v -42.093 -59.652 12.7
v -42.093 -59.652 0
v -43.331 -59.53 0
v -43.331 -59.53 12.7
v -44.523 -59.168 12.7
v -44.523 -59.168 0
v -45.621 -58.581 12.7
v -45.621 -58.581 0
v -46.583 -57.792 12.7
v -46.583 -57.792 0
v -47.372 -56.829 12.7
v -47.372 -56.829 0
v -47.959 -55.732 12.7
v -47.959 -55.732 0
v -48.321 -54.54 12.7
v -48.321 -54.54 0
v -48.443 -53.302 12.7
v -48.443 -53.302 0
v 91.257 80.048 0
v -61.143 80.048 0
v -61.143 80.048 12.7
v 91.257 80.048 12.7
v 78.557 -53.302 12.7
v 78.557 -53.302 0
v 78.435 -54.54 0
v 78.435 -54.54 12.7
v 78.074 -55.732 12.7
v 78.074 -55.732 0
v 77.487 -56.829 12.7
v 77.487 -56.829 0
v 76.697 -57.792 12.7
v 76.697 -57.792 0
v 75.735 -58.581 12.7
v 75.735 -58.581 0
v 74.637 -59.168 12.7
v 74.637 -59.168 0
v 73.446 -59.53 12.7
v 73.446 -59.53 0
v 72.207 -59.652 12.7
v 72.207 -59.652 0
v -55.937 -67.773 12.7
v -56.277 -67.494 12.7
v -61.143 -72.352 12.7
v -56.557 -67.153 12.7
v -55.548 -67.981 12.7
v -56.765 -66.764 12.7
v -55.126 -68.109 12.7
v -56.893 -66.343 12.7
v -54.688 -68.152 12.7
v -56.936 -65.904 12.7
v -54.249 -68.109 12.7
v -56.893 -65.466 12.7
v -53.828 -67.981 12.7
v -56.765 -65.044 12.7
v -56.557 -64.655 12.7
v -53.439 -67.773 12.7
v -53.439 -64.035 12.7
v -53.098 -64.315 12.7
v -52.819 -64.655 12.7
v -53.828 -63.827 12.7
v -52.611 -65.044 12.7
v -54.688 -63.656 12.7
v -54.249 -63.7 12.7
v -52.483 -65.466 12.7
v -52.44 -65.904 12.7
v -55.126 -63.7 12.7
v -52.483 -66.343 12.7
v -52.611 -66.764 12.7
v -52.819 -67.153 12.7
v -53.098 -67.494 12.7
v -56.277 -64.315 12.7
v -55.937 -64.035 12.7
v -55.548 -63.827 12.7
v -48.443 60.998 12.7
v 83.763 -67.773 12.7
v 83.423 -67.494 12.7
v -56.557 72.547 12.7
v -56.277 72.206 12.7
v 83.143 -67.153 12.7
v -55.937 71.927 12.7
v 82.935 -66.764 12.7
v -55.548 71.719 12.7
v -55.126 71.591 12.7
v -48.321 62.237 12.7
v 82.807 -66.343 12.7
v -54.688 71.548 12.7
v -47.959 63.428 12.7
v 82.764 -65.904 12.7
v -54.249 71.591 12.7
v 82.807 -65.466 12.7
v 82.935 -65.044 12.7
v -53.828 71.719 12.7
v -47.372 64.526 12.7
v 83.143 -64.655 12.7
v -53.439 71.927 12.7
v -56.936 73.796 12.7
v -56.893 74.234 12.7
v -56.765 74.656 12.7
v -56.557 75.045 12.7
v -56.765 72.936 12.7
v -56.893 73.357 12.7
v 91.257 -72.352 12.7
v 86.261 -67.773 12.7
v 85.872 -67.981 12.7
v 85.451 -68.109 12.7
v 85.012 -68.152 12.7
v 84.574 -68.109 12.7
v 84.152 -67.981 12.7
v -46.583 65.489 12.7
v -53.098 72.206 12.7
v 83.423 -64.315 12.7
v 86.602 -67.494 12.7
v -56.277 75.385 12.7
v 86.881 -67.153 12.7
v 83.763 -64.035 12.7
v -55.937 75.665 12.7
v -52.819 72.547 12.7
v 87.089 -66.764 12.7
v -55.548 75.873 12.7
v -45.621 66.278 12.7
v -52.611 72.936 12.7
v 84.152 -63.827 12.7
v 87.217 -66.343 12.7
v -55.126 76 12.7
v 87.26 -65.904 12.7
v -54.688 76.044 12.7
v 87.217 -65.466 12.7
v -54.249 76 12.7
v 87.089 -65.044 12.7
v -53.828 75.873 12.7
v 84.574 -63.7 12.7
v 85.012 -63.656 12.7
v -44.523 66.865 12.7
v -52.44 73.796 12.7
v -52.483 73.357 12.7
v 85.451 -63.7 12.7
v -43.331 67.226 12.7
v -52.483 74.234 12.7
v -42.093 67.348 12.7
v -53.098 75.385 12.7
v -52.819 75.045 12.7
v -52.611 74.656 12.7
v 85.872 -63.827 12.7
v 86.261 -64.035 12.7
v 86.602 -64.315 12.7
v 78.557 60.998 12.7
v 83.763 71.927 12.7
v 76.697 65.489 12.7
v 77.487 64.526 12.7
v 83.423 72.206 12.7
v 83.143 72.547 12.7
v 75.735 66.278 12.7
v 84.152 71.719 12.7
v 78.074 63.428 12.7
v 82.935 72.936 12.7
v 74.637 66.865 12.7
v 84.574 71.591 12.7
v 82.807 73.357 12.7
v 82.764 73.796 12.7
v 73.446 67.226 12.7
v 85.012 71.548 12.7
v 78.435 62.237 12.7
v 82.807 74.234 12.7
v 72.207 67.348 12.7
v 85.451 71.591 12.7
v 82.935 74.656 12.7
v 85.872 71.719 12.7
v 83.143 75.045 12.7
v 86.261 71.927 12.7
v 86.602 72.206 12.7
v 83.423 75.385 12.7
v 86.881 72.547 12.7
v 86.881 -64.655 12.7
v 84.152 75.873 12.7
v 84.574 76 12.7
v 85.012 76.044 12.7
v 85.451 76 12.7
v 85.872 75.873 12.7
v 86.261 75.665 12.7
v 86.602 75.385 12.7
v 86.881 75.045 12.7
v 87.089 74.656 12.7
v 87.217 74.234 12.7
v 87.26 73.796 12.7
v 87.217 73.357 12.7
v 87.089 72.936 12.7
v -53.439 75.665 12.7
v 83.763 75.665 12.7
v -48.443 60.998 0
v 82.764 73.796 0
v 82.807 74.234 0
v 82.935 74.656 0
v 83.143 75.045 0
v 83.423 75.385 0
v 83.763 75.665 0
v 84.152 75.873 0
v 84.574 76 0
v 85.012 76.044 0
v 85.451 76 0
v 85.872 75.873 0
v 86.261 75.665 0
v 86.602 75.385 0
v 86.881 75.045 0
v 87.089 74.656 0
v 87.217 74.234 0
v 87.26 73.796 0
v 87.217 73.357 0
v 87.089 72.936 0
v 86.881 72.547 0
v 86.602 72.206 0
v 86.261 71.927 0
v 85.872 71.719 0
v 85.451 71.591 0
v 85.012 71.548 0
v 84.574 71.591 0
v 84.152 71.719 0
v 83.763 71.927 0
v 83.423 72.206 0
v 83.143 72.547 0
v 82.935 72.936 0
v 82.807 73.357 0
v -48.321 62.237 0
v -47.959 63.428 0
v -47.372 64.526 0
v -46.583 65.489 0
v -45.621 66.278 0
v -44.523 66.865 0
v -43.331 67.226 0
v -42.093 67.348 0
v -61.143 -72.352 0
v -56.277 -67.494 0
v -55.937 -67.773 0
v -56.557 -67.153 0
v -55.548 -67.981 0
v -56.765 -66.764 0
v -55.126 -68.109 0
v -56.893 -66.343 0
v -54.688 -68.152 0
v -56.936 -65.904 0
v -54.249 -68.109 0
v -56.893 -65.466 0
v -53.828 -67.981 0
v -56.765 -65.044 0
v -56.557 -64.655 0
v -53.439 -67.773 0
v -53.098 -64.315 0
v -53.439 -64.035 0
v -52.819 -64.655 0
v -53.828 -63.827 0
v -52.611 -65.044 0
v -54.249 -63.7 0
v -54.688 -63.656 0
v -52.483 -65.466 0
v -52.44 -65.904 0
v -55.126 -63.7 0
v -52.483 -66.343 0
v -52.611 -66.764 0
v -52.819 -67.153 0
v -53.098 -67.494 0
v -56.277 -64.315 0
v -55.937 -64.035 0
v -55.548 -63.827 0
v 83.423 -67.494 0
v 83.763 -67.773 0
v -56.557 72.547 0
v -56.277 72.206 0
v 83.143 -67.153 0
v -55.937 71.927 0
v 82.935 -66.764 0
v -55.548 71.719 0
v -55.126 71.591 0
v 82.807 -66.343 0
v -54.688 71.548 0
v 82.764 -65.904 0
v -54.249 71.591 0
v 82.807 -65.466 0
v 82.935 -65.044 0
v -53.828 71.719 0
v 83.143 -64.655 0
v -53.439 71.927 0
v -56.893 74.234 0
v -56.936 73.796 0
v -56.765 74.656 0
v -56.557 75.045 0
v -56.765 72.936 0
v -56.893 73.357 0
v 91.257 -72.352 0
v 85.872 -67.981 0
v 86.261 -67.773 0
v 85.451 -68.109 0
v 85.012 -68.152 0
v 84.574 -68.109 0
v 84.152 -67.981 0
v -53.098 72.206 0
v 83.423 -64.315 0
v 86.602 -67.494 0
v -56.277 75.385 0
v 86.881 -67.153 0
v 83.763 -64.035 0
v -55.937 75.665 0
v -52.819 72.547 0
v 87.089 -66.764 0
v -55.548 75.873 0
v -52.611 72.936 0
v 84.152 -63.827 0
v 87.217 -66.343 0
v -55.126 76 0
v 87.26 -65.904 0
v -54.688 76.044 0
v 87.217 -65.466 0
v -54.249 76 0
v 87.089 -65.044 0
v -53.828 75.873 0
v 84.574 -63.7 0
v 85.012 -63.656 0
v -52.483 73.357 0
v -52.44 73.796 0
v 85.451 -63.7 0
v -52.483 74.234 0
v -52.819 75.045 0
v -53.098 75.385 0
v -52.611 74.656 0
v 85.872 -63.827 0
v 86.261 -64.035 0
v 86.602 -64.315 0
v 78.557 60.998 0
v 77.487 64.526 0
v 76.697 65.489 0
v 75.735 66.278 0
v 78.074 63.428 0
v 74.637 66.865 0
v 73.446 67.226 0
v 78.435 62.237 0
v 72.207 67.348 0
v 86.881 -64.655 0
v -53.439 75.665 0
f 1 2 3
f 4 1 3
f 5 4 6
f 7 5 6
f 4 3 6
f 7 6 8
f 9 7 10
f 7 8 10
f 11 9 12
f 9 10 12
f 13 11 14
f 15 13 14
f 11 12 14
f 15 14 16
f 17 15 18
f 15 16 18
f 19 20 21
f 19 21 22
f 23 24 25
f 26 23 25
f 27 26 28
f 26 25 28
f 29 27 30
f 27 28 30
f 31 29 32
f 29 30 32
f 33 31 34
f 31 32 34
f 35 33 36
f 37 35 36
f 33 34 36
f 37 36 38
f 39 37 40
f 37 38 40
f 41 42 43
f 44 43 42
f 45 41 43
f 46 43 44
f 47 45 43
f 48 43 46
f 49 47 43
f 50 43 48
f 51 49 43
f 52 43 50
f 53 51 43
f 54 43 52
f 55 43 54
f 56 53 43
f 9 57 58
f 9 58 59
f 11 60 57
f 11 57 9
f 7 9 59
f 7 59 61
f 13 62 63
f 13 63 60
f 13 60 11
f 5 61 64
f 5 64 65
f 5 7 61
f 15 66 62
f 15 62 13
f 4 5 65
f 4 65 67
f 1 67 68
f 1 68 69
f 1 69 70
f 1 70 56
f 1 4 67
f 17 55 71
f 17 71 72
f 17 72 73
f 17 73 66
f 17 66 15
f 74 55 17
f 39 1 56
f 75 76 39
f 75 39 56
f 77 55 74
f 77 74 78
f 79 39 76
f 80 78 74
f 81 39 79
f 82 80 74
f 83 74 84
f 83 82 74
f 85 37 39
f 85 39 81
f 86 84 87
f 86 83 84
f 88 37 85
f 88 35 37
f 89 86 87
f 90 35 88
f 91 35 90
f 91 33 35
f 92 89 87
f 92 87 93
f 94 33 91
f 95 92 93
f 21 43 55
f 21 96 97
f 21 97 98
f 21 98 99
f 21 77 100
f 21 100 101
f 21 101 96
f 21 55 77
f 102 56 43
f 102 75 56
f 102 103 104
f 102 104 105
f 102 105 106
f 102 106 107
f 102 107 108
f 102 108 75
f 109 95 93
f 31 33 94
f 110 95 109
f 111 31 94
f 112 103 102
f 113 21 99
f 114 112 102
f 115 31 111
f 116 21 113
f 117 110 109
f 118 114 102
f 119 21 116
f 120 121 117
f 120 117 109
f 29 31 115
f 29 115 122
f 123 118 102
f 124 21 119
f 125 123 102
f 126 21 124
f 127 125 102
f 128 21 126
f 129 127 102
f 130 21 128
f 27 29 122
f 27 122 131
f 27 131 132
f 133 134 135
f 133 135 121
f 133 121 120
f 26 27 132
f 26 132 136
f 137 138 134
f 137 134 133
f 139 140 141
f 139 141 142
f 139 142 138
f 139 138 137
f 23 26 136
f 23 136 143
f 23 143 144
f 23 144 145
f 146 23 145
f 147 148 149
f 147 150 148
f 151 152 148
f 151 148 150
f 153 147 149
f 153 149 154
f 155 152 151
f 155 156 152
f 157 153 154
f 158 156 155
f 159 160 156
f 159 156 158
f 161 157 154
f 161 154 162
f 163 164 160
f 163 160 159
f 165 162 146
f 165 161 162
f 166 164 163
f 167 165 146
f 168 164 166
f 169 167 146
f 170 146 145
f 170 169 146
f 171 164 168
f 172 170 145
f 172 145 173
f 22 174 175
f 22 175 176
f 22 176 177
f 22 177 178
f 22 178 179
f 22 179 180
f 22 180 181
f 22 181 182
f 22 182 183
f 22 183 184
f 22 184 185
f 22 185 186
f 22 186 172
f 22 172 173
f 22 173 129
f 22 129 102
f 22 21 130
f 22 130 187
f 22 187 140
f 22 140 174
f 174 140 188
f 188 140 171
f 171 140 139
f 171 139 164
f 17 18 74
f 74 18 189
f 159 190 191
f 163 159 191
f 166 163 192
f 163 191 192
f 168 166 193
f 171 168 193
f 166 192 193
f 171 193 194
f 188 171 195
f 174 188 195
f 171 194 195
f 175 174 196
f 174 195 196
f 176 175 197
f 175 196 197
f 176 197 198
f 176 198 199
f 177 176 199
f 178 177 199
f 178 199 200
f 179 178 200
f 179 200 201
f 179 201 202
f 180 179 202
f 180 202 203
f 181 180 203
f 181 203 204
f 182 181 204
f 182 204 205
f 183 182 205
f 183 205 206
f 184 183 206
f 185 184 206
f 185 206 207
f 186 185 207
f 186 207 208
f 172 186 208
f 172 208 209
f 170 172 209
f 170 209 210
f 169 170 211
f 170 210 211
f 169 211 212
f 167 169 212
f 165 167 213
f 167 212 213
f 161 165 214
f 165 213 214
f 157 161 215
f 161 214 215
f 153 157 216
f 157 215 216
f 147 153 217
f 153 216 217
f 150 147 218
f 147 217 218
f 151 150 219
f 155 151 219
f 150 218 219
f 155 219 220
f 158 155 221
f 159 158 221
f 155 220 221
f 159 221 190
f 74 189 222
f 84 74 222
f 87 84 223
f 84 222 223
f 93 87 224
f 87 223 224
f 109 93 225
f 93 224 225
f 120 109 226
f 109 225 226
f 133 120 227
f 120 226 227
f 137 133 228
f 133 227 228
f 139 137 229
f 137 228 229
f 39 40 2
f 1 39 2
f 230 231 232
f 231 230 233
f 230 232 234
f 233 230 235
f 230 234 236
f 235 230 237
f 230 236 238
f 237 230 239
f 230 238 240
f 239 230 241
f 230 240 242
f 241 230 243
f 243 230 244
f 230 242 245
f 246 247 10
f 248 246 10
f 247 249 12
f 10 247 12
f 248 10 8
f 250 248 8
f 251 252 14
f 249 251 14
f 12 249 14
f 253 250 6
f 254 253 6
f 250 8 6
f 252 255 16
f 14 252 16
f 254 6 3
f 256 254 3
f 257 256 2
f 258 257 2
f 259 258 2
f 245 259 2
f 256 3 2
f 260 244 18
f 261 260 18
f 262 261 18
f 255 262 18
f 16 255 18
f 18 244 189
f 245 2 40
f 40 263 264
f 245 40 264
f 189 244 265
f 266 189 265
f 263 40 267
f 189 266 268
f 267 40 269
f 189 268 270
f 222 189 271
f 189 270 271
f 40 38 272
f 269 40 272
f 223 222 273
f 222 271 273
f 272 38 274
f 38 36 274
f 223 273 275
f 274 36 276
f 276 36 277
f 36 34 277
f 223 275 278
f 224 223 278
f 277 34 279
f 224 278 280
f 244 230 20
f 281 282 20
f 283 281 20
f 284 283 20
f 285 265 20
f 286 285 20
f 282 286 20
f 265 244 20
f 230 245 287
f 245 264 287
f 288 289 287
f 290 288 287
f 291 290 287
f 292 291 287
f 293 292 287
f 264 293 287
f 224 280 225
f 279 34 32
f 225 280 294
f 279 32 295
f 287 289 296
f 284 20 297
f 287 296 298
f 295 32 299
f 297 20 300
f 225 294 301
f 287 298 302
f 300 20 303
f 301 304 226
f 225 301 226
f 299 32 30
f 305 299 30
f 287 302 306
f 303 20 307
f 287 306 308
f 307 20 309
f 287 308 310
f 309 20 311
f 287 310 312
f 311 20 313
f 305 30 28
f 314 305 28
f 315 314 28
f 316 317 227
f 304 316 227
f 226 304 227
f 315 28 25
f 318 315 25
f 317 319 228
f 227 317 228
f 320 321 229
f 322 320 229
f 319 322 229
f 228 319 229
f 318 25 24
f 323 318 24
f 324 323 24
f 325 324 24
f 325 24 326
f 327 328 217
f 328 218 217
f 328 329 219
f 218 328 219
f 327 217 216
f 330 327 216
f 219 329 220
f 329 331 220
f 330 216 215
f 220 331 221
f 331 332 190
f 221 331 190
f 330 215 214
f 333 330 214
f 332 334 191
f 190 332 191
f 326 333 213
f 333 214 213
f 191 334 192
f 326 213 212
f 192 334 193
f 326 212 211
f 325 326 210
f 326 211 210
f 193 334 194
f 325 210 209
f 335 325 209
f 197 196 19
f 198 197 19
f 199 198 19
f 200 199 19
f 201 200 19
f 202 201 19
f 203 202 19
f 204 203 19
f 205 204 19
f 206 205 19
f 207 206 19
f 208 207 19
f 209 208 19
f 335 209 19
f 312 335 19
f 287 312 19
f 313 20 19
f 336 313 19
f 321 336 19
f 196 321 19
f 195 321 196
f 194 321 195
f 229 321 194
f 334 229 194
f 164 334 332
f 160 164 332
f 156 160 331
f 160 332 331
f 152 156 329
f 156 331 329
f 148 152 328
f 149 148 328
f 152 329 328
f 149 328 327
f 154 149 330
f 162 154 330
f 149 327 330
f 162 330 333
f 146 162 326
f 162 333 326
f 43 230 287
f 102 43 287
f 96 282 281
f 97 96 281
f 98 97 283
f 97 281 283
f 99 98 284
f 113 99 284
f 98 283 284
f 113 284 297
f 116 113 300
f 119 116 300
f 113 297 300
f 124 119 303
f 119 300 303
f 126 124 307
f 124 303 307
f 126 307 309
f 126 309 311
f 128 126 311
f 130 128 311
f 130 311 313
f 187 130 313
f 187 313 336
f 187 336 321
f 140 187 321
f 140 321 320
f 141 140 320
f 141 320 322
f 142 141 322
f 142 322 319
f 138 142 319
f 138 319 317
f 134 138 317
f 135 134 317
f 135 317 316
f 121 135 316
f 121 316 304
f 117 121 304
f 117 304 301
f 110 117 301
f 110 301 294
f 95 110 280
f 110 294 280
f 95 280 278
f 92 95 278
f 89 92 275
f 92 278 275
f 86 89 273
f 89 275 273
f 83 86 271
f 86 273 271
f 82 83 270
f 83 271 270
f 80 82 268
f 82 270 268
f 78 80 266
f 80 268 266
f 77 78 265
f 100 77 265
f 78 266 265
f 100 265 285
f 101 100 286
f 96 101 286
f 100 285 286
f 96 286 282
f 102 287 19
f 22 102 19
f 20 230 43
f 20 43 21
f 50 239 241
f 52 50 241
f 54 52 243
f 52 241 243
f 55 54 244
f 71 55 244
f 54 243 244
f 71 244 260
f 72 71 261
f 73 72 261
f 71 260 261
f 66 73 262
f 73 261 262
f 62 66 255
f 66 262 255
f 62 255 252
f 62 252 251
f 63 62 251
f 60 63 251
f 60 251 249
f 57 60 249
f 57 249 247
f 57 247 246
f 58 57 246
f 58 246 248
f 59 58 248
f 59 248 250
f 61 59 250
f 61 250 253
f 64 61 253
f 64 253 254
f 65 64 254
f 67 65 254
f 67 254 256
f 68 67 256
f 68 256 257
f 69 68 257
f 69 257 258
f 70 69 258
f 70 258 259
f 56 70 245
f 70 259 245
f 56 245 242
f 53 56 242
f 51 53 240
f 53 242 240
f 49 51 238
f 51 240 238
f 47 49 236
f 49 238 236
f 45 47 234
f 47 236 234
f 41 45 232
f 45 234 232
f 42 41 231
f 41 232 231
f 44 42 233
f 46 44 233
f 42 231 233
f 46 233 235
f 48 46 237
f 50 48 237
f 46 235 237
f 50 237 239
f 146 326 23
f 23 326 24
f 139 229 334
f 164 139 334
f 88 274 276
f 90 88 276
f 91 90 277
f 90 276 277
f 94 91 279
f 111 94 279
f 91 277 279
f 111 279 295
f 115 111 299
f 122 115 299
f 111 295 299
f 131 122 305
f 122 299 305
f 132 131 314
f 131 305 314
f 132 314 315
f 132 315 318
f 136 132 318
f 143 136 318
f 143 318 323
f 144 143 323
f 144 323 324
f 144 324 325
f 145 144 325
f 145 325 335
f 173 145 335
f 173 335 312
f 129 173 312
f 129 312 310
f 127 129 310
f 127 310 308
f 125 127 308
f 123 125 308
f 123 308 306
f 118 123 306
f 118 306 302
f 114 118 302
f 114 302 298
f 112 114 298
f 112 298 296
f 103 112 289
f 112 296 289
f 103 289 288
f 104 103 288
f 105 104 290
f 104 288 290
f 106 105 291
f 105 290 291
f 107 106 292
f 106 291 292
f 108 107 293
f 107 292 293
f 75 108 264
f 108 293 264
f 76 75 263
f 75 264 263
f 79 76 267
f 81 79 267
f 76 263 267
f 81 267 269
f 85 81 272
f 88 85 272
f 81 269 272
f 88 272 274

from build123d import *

# Parameters (mm, degrees)
SKETCH1_W             = 152.4
SKETCH1_H             = 152.4
BOSS_EXTRUDE1_DEPTH   = 12.7
F_8_CLEARANCE_HOLE2_D = 4.4958
LPATTERN1_COUNT       = 2
LPATTERN1_PITCH       = 139.7
LPATTERN1_COUNT_DIR2  = 2
LPATTERN1_PITCH_DIR2  = 139.7


with BuildPart() as part:
    # Sketch1 → Boss-Extrude1 (new body)
    with BuildSketch(Plane.XY):
        with Locations((15.057340396, 3.848381836)):
            Rectangle(SKETCH1_W, SKETCH1_H)
        with BuildLine():
            Line((-42.092659604, 67.348381836), (72.207340396, 67.348381836))
            ThreePointArc((72.207340396, 67.348381836), (76.697468456, 65.488509896), (78.557340396, 60.998381836))
            Line((78.557340396, 60.998381836), (78.557340396, -53.301618164))
            ThreePointArc((78.557340396, -53.301618164), (76.697468456, -57.791746225), (72.207340396, -59.651618164))
            Line((72.207340396, -59.651618164), (-42.092659604, -59.651618164))
            ThreePointArc((-42.092659604, -59.651618164), (-46.582787665, -57.791746225), (-48.442659604, -53.301618164))
            Line((-48.442659604, -53.301618164), (-48.442659604, 60.998381836))
            ThreePointArc((-48.442659604, 60.998381836), (-46.582787665, 65.488509896), (-42.092659604, 67.348381836))
        make_face(mode=Mode.SUBTRACT)
    extrude(amount=BOSS_EXTRUDE1_DEPTH)

    # #8 Clearance Hole2 (through all)
    with Locations(Plane.XY.offset(12.7)):
        with Locations((-54.687907486, 73.795789856)):
            f_8_clearance_hole2 = Hole(F_8_CLEARANCE_HOLE2_D / 2)

    # LPattern1: 8 Clearance Hole2 2 × 2
    with Locations(*[(i * LPATTERN1_PITCH, -j * LPATTERN1_PITCH_DIR2, 0) for i in range(LPATTERN1_COUNT) for j in range(LPATTERN1_COUNT_DIR2) if (i, j) != (0, 0)]):
        add(f_8_clearance_hole2, mode=Mode.SUBTRACT)


solid = part.part
